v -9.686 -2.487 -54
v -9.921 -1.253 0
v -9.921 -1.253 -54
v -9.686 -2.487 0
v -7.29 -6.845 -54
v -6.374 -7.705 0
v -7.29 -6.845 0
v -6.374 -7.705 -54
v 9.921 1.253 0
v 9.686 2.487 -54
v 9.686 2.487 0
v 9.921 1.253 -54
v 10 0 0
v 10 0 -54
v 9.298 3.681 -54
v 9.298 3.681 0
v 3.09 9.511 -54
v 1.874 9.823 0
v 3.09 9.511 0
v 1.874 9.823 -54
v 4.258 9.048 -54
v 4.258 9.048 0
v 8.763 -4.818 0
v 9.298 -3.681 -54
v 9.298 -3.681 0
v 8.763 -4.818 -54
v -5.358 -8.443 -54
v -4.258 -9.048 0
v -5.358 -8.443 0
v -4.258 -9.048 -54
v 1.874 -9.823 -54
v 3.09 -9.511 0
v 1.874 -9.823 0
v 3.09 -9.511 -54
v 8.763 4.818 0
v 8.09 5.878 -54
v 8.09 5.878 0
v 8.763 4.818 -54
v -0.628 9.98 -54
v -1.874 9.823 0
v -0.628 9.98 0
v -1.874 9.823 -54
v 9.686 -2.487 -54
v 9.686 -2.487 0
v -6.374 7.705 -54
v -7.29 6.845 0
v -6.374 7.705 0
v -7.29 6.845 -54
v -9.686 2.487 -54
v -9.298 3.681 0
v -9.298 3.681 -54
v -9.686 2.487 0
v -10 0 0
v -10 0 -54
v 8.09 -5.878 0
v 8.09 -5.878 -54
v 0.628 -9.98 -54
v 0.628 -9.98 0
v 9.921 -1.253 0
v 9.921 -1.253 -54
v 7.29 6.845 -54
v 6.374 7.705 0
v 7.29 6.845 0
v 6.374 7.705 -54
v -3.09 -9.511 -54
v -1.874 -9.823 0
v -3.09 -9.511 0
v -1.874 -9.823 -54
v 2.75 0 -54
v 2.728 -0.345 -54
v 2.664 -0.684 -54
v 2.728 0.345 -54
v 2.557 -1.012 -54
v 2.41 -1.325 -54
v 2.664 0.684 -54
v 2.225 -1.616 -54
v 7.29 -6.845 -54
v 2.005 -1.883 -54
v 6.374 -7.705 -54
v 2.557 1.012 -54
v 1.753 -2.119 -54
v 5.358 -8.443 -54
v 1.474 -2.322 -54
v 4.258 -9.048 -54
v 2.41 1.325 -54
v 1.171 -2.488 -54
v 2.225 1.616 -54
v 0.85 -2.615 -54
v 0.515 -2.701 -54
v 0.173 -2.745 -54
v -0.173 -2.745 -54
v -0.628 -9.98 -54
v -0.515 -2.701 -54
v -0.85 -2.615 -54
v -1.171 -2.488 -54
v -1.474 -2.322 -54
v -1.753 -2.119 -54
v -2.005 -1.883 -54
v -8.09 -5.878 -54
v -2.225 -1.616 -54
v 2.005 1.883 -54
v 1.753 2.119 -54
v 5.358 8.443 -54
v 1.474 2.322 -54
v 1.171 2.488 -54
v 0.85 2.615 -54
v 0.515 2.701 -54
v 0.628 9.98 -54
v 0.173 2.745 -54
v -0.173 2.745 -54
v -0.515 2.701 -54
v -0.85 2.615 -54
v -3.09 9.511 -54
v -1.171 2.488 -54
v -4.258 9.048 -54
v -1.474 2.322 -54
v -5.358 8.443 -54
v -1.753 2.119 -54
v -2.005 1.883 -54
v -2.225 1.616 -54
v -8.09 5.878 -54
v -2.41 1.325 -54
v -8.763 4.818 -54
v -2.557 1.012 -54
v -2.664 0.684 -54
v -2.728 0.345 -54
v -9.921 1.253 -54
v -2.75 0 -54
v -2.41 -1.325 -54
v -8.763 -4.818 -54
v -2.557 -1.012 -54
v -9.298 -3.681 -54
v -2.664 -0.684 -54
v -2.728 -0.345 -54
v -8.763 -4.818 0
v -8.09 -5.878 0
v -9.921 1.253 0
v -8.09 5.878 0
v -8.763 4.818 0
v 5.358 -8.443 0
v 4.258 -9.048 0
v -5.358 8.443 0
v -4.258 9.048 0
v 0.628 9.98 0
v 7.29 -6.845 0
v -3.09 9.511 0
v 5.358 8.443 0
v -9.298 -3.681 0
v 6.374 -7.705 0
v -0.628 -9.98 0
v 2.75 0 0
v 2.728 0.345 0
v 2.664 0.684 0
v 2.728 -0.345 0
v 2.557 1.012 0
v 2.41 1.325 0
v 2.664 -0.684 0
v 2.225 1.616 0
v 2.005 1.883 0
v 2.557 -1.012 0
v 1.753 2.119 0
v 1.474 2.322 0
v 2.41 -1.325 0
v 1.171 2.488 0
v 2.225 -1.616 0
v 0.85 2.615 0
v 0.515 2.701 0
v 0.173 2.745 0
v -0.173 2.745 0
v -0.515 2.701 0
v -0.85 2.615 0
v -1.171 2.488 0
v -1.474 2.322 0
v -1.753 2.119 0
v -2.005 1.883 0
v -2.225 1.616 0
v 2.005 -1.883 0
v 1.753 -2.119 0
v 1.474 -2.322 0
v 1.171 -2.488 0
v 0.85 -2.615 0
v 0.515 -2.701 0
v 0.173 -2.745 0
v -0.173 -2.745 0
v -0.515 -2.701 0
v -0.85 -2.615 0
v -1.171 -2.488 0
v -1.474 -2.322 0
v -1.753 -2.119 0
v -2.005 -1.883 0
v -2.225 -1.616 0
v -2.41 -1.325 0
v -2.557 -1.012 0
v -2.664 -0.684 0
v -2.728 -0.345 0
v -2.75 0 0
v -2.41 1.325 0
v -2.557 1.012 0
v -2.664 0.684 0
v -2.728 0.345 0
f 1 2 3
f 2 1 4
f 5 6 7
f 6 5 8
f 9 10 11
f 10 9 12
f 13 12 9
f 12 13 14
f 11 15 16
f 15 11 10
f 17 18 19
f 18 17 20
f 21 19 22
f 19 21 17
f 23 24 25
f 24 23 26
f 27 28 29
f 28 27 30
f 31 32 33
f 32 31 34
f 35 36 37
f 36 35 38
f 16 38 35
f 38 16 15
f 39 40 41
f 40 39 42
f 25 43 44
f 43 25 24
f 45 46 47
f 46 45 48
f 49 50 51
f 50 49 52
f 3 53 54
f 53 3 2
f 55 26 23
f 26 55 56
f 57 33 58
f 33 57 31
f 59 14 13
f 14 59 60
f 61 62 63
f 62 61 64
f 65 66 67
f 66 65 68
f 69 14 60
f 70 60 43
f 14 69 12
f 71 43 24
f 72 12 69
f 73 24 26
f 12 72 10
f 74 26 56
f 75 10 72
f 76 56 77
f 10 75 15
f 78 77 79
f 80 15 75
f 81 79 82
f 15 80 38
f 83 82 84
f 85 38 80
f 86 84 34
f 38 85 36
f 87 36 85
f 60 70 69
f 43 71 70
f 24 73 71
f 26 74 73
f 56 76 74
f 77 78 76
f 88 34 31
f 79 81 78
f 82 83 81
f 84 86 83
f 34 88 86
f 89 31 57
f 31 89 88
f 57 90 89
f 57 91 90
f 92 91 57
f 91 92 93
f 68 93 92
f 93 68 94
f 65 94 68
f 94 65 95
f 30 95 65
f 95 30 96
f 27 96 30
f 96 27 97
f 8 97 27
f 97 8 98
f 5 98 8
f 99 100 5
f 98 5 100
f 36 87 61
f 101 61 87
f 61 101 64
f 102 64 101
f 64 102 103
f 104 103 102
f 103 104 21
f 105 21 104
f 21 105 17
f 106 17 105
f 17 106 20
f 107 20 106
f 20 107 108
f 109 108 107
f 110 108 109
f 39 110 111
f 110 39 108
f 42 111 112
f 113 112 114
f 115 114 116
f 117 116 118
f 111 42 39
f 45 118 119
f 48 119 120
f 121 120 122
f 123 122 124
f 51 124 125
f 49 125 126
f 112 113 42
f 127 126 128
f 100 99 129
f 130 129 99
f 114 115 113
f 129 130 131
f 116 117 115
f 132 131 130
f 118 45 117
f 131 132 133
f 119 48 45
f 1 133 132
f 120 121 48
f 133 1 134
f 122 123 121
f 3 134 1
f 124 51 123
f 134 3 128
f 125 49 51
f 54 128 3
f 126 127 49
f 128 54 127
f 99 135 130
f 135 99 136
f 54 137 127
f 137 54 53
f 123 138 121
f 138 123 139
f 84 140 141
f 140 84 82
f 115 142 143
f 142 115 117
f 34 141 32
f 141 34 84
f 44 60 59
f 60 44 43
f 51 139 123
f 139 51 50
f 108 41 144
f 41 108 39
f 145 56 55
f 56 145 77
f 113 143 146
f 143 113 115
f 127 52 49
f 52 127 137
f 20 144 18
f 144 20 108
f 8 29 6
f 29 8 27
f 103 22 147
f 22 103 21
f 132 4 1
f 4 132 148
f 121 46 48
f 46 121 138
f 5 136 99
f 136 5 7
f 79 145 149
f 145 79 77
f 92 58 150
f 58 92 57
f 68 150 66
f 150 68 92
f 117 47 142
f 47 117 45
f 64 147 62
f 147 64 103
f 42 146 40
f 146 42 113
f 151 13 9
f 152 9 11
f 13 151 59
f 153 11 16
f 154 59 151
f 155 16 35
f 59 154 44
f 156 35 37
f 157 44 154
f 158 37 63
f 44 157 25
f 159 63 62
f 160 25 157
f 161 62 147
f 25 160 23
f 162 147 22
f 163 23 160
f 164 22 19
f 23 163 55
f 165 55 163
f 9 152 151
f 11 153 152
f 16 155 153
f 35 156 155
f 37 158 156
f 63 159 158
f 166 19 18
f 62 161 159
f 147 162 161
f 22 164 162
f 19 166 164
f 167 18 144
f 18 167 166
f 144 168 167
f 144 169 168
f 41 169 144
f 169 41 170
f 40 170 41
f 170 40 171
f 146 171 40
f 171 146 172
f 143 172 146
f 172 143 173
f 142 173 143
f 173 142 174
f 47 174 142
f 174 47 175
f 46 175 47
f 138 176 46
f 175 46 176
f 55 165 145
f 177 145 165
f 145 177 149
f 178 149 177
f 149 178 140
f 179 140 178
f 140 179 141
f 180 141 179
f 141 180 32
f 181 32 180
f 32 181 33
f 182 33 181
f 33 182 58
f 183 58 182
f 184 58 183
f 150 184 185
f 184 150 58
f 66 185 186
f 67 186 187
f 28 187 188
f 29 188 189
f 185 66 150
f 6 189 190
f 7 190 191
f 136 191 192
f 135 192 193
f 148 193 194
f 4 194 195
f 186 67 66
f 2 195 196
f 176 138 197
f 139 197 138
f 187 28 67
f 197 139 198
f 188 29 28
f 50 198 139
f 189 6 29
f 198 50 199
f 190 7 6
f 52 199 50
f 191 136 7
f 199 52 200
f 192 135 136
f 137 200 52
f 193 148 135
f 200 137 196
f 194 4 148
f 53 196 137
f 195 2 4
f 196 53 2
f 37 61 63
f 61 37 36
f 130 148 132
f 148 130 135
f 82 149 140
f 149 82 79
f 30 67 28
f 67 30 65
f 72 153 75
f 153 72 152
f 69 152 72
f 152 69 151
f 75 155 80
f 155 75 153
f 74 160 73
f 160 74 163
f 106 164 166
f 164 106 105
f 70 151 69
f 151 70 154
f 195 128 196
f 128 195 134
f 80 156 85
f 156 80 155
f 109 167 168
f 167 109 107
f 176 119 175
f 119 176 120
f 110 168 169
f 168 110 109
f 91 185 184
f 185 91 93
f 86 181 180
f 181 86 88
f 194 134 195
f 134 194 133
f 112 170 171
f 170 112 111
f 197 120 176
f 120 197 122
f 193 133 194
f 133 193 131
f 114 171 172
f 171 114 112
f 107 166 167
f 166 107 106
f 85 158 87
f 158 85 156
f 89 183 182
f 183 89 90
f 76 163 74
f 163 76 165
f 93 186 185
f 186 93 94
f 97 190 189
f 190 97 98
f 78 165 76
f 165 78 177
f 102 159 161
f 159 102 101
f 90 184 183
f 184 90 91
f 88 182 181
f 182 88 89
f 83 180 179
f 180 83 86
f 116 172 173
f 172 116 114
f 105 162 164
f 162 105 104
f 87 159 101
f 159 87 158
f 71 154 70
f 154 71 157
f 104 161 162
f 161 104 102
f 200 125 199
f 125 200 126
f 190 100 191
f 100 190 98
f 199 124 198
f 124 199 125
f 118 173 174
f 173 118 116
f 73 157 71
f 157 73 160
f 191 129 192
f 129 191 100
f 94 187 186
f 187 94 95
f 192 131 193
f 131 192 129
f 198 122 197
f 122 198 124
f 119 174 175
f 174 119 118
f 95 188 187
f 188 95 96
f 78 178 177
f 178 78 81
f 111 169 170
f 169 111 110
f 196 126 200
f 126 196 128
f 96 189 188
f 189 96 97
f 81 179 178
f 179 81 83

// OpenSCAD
$fn = 50;


difference() {
	union() {
		translate(v = [0, 0, -54.0000000000]) {
			cylinder(h = 54, r = 10.0000000000);
		}
	}
	union() {
		#translate(v = [0, 0, -54]) {
			cylinder(h = 54, r = 2.7500000000);
		}
	}
}
